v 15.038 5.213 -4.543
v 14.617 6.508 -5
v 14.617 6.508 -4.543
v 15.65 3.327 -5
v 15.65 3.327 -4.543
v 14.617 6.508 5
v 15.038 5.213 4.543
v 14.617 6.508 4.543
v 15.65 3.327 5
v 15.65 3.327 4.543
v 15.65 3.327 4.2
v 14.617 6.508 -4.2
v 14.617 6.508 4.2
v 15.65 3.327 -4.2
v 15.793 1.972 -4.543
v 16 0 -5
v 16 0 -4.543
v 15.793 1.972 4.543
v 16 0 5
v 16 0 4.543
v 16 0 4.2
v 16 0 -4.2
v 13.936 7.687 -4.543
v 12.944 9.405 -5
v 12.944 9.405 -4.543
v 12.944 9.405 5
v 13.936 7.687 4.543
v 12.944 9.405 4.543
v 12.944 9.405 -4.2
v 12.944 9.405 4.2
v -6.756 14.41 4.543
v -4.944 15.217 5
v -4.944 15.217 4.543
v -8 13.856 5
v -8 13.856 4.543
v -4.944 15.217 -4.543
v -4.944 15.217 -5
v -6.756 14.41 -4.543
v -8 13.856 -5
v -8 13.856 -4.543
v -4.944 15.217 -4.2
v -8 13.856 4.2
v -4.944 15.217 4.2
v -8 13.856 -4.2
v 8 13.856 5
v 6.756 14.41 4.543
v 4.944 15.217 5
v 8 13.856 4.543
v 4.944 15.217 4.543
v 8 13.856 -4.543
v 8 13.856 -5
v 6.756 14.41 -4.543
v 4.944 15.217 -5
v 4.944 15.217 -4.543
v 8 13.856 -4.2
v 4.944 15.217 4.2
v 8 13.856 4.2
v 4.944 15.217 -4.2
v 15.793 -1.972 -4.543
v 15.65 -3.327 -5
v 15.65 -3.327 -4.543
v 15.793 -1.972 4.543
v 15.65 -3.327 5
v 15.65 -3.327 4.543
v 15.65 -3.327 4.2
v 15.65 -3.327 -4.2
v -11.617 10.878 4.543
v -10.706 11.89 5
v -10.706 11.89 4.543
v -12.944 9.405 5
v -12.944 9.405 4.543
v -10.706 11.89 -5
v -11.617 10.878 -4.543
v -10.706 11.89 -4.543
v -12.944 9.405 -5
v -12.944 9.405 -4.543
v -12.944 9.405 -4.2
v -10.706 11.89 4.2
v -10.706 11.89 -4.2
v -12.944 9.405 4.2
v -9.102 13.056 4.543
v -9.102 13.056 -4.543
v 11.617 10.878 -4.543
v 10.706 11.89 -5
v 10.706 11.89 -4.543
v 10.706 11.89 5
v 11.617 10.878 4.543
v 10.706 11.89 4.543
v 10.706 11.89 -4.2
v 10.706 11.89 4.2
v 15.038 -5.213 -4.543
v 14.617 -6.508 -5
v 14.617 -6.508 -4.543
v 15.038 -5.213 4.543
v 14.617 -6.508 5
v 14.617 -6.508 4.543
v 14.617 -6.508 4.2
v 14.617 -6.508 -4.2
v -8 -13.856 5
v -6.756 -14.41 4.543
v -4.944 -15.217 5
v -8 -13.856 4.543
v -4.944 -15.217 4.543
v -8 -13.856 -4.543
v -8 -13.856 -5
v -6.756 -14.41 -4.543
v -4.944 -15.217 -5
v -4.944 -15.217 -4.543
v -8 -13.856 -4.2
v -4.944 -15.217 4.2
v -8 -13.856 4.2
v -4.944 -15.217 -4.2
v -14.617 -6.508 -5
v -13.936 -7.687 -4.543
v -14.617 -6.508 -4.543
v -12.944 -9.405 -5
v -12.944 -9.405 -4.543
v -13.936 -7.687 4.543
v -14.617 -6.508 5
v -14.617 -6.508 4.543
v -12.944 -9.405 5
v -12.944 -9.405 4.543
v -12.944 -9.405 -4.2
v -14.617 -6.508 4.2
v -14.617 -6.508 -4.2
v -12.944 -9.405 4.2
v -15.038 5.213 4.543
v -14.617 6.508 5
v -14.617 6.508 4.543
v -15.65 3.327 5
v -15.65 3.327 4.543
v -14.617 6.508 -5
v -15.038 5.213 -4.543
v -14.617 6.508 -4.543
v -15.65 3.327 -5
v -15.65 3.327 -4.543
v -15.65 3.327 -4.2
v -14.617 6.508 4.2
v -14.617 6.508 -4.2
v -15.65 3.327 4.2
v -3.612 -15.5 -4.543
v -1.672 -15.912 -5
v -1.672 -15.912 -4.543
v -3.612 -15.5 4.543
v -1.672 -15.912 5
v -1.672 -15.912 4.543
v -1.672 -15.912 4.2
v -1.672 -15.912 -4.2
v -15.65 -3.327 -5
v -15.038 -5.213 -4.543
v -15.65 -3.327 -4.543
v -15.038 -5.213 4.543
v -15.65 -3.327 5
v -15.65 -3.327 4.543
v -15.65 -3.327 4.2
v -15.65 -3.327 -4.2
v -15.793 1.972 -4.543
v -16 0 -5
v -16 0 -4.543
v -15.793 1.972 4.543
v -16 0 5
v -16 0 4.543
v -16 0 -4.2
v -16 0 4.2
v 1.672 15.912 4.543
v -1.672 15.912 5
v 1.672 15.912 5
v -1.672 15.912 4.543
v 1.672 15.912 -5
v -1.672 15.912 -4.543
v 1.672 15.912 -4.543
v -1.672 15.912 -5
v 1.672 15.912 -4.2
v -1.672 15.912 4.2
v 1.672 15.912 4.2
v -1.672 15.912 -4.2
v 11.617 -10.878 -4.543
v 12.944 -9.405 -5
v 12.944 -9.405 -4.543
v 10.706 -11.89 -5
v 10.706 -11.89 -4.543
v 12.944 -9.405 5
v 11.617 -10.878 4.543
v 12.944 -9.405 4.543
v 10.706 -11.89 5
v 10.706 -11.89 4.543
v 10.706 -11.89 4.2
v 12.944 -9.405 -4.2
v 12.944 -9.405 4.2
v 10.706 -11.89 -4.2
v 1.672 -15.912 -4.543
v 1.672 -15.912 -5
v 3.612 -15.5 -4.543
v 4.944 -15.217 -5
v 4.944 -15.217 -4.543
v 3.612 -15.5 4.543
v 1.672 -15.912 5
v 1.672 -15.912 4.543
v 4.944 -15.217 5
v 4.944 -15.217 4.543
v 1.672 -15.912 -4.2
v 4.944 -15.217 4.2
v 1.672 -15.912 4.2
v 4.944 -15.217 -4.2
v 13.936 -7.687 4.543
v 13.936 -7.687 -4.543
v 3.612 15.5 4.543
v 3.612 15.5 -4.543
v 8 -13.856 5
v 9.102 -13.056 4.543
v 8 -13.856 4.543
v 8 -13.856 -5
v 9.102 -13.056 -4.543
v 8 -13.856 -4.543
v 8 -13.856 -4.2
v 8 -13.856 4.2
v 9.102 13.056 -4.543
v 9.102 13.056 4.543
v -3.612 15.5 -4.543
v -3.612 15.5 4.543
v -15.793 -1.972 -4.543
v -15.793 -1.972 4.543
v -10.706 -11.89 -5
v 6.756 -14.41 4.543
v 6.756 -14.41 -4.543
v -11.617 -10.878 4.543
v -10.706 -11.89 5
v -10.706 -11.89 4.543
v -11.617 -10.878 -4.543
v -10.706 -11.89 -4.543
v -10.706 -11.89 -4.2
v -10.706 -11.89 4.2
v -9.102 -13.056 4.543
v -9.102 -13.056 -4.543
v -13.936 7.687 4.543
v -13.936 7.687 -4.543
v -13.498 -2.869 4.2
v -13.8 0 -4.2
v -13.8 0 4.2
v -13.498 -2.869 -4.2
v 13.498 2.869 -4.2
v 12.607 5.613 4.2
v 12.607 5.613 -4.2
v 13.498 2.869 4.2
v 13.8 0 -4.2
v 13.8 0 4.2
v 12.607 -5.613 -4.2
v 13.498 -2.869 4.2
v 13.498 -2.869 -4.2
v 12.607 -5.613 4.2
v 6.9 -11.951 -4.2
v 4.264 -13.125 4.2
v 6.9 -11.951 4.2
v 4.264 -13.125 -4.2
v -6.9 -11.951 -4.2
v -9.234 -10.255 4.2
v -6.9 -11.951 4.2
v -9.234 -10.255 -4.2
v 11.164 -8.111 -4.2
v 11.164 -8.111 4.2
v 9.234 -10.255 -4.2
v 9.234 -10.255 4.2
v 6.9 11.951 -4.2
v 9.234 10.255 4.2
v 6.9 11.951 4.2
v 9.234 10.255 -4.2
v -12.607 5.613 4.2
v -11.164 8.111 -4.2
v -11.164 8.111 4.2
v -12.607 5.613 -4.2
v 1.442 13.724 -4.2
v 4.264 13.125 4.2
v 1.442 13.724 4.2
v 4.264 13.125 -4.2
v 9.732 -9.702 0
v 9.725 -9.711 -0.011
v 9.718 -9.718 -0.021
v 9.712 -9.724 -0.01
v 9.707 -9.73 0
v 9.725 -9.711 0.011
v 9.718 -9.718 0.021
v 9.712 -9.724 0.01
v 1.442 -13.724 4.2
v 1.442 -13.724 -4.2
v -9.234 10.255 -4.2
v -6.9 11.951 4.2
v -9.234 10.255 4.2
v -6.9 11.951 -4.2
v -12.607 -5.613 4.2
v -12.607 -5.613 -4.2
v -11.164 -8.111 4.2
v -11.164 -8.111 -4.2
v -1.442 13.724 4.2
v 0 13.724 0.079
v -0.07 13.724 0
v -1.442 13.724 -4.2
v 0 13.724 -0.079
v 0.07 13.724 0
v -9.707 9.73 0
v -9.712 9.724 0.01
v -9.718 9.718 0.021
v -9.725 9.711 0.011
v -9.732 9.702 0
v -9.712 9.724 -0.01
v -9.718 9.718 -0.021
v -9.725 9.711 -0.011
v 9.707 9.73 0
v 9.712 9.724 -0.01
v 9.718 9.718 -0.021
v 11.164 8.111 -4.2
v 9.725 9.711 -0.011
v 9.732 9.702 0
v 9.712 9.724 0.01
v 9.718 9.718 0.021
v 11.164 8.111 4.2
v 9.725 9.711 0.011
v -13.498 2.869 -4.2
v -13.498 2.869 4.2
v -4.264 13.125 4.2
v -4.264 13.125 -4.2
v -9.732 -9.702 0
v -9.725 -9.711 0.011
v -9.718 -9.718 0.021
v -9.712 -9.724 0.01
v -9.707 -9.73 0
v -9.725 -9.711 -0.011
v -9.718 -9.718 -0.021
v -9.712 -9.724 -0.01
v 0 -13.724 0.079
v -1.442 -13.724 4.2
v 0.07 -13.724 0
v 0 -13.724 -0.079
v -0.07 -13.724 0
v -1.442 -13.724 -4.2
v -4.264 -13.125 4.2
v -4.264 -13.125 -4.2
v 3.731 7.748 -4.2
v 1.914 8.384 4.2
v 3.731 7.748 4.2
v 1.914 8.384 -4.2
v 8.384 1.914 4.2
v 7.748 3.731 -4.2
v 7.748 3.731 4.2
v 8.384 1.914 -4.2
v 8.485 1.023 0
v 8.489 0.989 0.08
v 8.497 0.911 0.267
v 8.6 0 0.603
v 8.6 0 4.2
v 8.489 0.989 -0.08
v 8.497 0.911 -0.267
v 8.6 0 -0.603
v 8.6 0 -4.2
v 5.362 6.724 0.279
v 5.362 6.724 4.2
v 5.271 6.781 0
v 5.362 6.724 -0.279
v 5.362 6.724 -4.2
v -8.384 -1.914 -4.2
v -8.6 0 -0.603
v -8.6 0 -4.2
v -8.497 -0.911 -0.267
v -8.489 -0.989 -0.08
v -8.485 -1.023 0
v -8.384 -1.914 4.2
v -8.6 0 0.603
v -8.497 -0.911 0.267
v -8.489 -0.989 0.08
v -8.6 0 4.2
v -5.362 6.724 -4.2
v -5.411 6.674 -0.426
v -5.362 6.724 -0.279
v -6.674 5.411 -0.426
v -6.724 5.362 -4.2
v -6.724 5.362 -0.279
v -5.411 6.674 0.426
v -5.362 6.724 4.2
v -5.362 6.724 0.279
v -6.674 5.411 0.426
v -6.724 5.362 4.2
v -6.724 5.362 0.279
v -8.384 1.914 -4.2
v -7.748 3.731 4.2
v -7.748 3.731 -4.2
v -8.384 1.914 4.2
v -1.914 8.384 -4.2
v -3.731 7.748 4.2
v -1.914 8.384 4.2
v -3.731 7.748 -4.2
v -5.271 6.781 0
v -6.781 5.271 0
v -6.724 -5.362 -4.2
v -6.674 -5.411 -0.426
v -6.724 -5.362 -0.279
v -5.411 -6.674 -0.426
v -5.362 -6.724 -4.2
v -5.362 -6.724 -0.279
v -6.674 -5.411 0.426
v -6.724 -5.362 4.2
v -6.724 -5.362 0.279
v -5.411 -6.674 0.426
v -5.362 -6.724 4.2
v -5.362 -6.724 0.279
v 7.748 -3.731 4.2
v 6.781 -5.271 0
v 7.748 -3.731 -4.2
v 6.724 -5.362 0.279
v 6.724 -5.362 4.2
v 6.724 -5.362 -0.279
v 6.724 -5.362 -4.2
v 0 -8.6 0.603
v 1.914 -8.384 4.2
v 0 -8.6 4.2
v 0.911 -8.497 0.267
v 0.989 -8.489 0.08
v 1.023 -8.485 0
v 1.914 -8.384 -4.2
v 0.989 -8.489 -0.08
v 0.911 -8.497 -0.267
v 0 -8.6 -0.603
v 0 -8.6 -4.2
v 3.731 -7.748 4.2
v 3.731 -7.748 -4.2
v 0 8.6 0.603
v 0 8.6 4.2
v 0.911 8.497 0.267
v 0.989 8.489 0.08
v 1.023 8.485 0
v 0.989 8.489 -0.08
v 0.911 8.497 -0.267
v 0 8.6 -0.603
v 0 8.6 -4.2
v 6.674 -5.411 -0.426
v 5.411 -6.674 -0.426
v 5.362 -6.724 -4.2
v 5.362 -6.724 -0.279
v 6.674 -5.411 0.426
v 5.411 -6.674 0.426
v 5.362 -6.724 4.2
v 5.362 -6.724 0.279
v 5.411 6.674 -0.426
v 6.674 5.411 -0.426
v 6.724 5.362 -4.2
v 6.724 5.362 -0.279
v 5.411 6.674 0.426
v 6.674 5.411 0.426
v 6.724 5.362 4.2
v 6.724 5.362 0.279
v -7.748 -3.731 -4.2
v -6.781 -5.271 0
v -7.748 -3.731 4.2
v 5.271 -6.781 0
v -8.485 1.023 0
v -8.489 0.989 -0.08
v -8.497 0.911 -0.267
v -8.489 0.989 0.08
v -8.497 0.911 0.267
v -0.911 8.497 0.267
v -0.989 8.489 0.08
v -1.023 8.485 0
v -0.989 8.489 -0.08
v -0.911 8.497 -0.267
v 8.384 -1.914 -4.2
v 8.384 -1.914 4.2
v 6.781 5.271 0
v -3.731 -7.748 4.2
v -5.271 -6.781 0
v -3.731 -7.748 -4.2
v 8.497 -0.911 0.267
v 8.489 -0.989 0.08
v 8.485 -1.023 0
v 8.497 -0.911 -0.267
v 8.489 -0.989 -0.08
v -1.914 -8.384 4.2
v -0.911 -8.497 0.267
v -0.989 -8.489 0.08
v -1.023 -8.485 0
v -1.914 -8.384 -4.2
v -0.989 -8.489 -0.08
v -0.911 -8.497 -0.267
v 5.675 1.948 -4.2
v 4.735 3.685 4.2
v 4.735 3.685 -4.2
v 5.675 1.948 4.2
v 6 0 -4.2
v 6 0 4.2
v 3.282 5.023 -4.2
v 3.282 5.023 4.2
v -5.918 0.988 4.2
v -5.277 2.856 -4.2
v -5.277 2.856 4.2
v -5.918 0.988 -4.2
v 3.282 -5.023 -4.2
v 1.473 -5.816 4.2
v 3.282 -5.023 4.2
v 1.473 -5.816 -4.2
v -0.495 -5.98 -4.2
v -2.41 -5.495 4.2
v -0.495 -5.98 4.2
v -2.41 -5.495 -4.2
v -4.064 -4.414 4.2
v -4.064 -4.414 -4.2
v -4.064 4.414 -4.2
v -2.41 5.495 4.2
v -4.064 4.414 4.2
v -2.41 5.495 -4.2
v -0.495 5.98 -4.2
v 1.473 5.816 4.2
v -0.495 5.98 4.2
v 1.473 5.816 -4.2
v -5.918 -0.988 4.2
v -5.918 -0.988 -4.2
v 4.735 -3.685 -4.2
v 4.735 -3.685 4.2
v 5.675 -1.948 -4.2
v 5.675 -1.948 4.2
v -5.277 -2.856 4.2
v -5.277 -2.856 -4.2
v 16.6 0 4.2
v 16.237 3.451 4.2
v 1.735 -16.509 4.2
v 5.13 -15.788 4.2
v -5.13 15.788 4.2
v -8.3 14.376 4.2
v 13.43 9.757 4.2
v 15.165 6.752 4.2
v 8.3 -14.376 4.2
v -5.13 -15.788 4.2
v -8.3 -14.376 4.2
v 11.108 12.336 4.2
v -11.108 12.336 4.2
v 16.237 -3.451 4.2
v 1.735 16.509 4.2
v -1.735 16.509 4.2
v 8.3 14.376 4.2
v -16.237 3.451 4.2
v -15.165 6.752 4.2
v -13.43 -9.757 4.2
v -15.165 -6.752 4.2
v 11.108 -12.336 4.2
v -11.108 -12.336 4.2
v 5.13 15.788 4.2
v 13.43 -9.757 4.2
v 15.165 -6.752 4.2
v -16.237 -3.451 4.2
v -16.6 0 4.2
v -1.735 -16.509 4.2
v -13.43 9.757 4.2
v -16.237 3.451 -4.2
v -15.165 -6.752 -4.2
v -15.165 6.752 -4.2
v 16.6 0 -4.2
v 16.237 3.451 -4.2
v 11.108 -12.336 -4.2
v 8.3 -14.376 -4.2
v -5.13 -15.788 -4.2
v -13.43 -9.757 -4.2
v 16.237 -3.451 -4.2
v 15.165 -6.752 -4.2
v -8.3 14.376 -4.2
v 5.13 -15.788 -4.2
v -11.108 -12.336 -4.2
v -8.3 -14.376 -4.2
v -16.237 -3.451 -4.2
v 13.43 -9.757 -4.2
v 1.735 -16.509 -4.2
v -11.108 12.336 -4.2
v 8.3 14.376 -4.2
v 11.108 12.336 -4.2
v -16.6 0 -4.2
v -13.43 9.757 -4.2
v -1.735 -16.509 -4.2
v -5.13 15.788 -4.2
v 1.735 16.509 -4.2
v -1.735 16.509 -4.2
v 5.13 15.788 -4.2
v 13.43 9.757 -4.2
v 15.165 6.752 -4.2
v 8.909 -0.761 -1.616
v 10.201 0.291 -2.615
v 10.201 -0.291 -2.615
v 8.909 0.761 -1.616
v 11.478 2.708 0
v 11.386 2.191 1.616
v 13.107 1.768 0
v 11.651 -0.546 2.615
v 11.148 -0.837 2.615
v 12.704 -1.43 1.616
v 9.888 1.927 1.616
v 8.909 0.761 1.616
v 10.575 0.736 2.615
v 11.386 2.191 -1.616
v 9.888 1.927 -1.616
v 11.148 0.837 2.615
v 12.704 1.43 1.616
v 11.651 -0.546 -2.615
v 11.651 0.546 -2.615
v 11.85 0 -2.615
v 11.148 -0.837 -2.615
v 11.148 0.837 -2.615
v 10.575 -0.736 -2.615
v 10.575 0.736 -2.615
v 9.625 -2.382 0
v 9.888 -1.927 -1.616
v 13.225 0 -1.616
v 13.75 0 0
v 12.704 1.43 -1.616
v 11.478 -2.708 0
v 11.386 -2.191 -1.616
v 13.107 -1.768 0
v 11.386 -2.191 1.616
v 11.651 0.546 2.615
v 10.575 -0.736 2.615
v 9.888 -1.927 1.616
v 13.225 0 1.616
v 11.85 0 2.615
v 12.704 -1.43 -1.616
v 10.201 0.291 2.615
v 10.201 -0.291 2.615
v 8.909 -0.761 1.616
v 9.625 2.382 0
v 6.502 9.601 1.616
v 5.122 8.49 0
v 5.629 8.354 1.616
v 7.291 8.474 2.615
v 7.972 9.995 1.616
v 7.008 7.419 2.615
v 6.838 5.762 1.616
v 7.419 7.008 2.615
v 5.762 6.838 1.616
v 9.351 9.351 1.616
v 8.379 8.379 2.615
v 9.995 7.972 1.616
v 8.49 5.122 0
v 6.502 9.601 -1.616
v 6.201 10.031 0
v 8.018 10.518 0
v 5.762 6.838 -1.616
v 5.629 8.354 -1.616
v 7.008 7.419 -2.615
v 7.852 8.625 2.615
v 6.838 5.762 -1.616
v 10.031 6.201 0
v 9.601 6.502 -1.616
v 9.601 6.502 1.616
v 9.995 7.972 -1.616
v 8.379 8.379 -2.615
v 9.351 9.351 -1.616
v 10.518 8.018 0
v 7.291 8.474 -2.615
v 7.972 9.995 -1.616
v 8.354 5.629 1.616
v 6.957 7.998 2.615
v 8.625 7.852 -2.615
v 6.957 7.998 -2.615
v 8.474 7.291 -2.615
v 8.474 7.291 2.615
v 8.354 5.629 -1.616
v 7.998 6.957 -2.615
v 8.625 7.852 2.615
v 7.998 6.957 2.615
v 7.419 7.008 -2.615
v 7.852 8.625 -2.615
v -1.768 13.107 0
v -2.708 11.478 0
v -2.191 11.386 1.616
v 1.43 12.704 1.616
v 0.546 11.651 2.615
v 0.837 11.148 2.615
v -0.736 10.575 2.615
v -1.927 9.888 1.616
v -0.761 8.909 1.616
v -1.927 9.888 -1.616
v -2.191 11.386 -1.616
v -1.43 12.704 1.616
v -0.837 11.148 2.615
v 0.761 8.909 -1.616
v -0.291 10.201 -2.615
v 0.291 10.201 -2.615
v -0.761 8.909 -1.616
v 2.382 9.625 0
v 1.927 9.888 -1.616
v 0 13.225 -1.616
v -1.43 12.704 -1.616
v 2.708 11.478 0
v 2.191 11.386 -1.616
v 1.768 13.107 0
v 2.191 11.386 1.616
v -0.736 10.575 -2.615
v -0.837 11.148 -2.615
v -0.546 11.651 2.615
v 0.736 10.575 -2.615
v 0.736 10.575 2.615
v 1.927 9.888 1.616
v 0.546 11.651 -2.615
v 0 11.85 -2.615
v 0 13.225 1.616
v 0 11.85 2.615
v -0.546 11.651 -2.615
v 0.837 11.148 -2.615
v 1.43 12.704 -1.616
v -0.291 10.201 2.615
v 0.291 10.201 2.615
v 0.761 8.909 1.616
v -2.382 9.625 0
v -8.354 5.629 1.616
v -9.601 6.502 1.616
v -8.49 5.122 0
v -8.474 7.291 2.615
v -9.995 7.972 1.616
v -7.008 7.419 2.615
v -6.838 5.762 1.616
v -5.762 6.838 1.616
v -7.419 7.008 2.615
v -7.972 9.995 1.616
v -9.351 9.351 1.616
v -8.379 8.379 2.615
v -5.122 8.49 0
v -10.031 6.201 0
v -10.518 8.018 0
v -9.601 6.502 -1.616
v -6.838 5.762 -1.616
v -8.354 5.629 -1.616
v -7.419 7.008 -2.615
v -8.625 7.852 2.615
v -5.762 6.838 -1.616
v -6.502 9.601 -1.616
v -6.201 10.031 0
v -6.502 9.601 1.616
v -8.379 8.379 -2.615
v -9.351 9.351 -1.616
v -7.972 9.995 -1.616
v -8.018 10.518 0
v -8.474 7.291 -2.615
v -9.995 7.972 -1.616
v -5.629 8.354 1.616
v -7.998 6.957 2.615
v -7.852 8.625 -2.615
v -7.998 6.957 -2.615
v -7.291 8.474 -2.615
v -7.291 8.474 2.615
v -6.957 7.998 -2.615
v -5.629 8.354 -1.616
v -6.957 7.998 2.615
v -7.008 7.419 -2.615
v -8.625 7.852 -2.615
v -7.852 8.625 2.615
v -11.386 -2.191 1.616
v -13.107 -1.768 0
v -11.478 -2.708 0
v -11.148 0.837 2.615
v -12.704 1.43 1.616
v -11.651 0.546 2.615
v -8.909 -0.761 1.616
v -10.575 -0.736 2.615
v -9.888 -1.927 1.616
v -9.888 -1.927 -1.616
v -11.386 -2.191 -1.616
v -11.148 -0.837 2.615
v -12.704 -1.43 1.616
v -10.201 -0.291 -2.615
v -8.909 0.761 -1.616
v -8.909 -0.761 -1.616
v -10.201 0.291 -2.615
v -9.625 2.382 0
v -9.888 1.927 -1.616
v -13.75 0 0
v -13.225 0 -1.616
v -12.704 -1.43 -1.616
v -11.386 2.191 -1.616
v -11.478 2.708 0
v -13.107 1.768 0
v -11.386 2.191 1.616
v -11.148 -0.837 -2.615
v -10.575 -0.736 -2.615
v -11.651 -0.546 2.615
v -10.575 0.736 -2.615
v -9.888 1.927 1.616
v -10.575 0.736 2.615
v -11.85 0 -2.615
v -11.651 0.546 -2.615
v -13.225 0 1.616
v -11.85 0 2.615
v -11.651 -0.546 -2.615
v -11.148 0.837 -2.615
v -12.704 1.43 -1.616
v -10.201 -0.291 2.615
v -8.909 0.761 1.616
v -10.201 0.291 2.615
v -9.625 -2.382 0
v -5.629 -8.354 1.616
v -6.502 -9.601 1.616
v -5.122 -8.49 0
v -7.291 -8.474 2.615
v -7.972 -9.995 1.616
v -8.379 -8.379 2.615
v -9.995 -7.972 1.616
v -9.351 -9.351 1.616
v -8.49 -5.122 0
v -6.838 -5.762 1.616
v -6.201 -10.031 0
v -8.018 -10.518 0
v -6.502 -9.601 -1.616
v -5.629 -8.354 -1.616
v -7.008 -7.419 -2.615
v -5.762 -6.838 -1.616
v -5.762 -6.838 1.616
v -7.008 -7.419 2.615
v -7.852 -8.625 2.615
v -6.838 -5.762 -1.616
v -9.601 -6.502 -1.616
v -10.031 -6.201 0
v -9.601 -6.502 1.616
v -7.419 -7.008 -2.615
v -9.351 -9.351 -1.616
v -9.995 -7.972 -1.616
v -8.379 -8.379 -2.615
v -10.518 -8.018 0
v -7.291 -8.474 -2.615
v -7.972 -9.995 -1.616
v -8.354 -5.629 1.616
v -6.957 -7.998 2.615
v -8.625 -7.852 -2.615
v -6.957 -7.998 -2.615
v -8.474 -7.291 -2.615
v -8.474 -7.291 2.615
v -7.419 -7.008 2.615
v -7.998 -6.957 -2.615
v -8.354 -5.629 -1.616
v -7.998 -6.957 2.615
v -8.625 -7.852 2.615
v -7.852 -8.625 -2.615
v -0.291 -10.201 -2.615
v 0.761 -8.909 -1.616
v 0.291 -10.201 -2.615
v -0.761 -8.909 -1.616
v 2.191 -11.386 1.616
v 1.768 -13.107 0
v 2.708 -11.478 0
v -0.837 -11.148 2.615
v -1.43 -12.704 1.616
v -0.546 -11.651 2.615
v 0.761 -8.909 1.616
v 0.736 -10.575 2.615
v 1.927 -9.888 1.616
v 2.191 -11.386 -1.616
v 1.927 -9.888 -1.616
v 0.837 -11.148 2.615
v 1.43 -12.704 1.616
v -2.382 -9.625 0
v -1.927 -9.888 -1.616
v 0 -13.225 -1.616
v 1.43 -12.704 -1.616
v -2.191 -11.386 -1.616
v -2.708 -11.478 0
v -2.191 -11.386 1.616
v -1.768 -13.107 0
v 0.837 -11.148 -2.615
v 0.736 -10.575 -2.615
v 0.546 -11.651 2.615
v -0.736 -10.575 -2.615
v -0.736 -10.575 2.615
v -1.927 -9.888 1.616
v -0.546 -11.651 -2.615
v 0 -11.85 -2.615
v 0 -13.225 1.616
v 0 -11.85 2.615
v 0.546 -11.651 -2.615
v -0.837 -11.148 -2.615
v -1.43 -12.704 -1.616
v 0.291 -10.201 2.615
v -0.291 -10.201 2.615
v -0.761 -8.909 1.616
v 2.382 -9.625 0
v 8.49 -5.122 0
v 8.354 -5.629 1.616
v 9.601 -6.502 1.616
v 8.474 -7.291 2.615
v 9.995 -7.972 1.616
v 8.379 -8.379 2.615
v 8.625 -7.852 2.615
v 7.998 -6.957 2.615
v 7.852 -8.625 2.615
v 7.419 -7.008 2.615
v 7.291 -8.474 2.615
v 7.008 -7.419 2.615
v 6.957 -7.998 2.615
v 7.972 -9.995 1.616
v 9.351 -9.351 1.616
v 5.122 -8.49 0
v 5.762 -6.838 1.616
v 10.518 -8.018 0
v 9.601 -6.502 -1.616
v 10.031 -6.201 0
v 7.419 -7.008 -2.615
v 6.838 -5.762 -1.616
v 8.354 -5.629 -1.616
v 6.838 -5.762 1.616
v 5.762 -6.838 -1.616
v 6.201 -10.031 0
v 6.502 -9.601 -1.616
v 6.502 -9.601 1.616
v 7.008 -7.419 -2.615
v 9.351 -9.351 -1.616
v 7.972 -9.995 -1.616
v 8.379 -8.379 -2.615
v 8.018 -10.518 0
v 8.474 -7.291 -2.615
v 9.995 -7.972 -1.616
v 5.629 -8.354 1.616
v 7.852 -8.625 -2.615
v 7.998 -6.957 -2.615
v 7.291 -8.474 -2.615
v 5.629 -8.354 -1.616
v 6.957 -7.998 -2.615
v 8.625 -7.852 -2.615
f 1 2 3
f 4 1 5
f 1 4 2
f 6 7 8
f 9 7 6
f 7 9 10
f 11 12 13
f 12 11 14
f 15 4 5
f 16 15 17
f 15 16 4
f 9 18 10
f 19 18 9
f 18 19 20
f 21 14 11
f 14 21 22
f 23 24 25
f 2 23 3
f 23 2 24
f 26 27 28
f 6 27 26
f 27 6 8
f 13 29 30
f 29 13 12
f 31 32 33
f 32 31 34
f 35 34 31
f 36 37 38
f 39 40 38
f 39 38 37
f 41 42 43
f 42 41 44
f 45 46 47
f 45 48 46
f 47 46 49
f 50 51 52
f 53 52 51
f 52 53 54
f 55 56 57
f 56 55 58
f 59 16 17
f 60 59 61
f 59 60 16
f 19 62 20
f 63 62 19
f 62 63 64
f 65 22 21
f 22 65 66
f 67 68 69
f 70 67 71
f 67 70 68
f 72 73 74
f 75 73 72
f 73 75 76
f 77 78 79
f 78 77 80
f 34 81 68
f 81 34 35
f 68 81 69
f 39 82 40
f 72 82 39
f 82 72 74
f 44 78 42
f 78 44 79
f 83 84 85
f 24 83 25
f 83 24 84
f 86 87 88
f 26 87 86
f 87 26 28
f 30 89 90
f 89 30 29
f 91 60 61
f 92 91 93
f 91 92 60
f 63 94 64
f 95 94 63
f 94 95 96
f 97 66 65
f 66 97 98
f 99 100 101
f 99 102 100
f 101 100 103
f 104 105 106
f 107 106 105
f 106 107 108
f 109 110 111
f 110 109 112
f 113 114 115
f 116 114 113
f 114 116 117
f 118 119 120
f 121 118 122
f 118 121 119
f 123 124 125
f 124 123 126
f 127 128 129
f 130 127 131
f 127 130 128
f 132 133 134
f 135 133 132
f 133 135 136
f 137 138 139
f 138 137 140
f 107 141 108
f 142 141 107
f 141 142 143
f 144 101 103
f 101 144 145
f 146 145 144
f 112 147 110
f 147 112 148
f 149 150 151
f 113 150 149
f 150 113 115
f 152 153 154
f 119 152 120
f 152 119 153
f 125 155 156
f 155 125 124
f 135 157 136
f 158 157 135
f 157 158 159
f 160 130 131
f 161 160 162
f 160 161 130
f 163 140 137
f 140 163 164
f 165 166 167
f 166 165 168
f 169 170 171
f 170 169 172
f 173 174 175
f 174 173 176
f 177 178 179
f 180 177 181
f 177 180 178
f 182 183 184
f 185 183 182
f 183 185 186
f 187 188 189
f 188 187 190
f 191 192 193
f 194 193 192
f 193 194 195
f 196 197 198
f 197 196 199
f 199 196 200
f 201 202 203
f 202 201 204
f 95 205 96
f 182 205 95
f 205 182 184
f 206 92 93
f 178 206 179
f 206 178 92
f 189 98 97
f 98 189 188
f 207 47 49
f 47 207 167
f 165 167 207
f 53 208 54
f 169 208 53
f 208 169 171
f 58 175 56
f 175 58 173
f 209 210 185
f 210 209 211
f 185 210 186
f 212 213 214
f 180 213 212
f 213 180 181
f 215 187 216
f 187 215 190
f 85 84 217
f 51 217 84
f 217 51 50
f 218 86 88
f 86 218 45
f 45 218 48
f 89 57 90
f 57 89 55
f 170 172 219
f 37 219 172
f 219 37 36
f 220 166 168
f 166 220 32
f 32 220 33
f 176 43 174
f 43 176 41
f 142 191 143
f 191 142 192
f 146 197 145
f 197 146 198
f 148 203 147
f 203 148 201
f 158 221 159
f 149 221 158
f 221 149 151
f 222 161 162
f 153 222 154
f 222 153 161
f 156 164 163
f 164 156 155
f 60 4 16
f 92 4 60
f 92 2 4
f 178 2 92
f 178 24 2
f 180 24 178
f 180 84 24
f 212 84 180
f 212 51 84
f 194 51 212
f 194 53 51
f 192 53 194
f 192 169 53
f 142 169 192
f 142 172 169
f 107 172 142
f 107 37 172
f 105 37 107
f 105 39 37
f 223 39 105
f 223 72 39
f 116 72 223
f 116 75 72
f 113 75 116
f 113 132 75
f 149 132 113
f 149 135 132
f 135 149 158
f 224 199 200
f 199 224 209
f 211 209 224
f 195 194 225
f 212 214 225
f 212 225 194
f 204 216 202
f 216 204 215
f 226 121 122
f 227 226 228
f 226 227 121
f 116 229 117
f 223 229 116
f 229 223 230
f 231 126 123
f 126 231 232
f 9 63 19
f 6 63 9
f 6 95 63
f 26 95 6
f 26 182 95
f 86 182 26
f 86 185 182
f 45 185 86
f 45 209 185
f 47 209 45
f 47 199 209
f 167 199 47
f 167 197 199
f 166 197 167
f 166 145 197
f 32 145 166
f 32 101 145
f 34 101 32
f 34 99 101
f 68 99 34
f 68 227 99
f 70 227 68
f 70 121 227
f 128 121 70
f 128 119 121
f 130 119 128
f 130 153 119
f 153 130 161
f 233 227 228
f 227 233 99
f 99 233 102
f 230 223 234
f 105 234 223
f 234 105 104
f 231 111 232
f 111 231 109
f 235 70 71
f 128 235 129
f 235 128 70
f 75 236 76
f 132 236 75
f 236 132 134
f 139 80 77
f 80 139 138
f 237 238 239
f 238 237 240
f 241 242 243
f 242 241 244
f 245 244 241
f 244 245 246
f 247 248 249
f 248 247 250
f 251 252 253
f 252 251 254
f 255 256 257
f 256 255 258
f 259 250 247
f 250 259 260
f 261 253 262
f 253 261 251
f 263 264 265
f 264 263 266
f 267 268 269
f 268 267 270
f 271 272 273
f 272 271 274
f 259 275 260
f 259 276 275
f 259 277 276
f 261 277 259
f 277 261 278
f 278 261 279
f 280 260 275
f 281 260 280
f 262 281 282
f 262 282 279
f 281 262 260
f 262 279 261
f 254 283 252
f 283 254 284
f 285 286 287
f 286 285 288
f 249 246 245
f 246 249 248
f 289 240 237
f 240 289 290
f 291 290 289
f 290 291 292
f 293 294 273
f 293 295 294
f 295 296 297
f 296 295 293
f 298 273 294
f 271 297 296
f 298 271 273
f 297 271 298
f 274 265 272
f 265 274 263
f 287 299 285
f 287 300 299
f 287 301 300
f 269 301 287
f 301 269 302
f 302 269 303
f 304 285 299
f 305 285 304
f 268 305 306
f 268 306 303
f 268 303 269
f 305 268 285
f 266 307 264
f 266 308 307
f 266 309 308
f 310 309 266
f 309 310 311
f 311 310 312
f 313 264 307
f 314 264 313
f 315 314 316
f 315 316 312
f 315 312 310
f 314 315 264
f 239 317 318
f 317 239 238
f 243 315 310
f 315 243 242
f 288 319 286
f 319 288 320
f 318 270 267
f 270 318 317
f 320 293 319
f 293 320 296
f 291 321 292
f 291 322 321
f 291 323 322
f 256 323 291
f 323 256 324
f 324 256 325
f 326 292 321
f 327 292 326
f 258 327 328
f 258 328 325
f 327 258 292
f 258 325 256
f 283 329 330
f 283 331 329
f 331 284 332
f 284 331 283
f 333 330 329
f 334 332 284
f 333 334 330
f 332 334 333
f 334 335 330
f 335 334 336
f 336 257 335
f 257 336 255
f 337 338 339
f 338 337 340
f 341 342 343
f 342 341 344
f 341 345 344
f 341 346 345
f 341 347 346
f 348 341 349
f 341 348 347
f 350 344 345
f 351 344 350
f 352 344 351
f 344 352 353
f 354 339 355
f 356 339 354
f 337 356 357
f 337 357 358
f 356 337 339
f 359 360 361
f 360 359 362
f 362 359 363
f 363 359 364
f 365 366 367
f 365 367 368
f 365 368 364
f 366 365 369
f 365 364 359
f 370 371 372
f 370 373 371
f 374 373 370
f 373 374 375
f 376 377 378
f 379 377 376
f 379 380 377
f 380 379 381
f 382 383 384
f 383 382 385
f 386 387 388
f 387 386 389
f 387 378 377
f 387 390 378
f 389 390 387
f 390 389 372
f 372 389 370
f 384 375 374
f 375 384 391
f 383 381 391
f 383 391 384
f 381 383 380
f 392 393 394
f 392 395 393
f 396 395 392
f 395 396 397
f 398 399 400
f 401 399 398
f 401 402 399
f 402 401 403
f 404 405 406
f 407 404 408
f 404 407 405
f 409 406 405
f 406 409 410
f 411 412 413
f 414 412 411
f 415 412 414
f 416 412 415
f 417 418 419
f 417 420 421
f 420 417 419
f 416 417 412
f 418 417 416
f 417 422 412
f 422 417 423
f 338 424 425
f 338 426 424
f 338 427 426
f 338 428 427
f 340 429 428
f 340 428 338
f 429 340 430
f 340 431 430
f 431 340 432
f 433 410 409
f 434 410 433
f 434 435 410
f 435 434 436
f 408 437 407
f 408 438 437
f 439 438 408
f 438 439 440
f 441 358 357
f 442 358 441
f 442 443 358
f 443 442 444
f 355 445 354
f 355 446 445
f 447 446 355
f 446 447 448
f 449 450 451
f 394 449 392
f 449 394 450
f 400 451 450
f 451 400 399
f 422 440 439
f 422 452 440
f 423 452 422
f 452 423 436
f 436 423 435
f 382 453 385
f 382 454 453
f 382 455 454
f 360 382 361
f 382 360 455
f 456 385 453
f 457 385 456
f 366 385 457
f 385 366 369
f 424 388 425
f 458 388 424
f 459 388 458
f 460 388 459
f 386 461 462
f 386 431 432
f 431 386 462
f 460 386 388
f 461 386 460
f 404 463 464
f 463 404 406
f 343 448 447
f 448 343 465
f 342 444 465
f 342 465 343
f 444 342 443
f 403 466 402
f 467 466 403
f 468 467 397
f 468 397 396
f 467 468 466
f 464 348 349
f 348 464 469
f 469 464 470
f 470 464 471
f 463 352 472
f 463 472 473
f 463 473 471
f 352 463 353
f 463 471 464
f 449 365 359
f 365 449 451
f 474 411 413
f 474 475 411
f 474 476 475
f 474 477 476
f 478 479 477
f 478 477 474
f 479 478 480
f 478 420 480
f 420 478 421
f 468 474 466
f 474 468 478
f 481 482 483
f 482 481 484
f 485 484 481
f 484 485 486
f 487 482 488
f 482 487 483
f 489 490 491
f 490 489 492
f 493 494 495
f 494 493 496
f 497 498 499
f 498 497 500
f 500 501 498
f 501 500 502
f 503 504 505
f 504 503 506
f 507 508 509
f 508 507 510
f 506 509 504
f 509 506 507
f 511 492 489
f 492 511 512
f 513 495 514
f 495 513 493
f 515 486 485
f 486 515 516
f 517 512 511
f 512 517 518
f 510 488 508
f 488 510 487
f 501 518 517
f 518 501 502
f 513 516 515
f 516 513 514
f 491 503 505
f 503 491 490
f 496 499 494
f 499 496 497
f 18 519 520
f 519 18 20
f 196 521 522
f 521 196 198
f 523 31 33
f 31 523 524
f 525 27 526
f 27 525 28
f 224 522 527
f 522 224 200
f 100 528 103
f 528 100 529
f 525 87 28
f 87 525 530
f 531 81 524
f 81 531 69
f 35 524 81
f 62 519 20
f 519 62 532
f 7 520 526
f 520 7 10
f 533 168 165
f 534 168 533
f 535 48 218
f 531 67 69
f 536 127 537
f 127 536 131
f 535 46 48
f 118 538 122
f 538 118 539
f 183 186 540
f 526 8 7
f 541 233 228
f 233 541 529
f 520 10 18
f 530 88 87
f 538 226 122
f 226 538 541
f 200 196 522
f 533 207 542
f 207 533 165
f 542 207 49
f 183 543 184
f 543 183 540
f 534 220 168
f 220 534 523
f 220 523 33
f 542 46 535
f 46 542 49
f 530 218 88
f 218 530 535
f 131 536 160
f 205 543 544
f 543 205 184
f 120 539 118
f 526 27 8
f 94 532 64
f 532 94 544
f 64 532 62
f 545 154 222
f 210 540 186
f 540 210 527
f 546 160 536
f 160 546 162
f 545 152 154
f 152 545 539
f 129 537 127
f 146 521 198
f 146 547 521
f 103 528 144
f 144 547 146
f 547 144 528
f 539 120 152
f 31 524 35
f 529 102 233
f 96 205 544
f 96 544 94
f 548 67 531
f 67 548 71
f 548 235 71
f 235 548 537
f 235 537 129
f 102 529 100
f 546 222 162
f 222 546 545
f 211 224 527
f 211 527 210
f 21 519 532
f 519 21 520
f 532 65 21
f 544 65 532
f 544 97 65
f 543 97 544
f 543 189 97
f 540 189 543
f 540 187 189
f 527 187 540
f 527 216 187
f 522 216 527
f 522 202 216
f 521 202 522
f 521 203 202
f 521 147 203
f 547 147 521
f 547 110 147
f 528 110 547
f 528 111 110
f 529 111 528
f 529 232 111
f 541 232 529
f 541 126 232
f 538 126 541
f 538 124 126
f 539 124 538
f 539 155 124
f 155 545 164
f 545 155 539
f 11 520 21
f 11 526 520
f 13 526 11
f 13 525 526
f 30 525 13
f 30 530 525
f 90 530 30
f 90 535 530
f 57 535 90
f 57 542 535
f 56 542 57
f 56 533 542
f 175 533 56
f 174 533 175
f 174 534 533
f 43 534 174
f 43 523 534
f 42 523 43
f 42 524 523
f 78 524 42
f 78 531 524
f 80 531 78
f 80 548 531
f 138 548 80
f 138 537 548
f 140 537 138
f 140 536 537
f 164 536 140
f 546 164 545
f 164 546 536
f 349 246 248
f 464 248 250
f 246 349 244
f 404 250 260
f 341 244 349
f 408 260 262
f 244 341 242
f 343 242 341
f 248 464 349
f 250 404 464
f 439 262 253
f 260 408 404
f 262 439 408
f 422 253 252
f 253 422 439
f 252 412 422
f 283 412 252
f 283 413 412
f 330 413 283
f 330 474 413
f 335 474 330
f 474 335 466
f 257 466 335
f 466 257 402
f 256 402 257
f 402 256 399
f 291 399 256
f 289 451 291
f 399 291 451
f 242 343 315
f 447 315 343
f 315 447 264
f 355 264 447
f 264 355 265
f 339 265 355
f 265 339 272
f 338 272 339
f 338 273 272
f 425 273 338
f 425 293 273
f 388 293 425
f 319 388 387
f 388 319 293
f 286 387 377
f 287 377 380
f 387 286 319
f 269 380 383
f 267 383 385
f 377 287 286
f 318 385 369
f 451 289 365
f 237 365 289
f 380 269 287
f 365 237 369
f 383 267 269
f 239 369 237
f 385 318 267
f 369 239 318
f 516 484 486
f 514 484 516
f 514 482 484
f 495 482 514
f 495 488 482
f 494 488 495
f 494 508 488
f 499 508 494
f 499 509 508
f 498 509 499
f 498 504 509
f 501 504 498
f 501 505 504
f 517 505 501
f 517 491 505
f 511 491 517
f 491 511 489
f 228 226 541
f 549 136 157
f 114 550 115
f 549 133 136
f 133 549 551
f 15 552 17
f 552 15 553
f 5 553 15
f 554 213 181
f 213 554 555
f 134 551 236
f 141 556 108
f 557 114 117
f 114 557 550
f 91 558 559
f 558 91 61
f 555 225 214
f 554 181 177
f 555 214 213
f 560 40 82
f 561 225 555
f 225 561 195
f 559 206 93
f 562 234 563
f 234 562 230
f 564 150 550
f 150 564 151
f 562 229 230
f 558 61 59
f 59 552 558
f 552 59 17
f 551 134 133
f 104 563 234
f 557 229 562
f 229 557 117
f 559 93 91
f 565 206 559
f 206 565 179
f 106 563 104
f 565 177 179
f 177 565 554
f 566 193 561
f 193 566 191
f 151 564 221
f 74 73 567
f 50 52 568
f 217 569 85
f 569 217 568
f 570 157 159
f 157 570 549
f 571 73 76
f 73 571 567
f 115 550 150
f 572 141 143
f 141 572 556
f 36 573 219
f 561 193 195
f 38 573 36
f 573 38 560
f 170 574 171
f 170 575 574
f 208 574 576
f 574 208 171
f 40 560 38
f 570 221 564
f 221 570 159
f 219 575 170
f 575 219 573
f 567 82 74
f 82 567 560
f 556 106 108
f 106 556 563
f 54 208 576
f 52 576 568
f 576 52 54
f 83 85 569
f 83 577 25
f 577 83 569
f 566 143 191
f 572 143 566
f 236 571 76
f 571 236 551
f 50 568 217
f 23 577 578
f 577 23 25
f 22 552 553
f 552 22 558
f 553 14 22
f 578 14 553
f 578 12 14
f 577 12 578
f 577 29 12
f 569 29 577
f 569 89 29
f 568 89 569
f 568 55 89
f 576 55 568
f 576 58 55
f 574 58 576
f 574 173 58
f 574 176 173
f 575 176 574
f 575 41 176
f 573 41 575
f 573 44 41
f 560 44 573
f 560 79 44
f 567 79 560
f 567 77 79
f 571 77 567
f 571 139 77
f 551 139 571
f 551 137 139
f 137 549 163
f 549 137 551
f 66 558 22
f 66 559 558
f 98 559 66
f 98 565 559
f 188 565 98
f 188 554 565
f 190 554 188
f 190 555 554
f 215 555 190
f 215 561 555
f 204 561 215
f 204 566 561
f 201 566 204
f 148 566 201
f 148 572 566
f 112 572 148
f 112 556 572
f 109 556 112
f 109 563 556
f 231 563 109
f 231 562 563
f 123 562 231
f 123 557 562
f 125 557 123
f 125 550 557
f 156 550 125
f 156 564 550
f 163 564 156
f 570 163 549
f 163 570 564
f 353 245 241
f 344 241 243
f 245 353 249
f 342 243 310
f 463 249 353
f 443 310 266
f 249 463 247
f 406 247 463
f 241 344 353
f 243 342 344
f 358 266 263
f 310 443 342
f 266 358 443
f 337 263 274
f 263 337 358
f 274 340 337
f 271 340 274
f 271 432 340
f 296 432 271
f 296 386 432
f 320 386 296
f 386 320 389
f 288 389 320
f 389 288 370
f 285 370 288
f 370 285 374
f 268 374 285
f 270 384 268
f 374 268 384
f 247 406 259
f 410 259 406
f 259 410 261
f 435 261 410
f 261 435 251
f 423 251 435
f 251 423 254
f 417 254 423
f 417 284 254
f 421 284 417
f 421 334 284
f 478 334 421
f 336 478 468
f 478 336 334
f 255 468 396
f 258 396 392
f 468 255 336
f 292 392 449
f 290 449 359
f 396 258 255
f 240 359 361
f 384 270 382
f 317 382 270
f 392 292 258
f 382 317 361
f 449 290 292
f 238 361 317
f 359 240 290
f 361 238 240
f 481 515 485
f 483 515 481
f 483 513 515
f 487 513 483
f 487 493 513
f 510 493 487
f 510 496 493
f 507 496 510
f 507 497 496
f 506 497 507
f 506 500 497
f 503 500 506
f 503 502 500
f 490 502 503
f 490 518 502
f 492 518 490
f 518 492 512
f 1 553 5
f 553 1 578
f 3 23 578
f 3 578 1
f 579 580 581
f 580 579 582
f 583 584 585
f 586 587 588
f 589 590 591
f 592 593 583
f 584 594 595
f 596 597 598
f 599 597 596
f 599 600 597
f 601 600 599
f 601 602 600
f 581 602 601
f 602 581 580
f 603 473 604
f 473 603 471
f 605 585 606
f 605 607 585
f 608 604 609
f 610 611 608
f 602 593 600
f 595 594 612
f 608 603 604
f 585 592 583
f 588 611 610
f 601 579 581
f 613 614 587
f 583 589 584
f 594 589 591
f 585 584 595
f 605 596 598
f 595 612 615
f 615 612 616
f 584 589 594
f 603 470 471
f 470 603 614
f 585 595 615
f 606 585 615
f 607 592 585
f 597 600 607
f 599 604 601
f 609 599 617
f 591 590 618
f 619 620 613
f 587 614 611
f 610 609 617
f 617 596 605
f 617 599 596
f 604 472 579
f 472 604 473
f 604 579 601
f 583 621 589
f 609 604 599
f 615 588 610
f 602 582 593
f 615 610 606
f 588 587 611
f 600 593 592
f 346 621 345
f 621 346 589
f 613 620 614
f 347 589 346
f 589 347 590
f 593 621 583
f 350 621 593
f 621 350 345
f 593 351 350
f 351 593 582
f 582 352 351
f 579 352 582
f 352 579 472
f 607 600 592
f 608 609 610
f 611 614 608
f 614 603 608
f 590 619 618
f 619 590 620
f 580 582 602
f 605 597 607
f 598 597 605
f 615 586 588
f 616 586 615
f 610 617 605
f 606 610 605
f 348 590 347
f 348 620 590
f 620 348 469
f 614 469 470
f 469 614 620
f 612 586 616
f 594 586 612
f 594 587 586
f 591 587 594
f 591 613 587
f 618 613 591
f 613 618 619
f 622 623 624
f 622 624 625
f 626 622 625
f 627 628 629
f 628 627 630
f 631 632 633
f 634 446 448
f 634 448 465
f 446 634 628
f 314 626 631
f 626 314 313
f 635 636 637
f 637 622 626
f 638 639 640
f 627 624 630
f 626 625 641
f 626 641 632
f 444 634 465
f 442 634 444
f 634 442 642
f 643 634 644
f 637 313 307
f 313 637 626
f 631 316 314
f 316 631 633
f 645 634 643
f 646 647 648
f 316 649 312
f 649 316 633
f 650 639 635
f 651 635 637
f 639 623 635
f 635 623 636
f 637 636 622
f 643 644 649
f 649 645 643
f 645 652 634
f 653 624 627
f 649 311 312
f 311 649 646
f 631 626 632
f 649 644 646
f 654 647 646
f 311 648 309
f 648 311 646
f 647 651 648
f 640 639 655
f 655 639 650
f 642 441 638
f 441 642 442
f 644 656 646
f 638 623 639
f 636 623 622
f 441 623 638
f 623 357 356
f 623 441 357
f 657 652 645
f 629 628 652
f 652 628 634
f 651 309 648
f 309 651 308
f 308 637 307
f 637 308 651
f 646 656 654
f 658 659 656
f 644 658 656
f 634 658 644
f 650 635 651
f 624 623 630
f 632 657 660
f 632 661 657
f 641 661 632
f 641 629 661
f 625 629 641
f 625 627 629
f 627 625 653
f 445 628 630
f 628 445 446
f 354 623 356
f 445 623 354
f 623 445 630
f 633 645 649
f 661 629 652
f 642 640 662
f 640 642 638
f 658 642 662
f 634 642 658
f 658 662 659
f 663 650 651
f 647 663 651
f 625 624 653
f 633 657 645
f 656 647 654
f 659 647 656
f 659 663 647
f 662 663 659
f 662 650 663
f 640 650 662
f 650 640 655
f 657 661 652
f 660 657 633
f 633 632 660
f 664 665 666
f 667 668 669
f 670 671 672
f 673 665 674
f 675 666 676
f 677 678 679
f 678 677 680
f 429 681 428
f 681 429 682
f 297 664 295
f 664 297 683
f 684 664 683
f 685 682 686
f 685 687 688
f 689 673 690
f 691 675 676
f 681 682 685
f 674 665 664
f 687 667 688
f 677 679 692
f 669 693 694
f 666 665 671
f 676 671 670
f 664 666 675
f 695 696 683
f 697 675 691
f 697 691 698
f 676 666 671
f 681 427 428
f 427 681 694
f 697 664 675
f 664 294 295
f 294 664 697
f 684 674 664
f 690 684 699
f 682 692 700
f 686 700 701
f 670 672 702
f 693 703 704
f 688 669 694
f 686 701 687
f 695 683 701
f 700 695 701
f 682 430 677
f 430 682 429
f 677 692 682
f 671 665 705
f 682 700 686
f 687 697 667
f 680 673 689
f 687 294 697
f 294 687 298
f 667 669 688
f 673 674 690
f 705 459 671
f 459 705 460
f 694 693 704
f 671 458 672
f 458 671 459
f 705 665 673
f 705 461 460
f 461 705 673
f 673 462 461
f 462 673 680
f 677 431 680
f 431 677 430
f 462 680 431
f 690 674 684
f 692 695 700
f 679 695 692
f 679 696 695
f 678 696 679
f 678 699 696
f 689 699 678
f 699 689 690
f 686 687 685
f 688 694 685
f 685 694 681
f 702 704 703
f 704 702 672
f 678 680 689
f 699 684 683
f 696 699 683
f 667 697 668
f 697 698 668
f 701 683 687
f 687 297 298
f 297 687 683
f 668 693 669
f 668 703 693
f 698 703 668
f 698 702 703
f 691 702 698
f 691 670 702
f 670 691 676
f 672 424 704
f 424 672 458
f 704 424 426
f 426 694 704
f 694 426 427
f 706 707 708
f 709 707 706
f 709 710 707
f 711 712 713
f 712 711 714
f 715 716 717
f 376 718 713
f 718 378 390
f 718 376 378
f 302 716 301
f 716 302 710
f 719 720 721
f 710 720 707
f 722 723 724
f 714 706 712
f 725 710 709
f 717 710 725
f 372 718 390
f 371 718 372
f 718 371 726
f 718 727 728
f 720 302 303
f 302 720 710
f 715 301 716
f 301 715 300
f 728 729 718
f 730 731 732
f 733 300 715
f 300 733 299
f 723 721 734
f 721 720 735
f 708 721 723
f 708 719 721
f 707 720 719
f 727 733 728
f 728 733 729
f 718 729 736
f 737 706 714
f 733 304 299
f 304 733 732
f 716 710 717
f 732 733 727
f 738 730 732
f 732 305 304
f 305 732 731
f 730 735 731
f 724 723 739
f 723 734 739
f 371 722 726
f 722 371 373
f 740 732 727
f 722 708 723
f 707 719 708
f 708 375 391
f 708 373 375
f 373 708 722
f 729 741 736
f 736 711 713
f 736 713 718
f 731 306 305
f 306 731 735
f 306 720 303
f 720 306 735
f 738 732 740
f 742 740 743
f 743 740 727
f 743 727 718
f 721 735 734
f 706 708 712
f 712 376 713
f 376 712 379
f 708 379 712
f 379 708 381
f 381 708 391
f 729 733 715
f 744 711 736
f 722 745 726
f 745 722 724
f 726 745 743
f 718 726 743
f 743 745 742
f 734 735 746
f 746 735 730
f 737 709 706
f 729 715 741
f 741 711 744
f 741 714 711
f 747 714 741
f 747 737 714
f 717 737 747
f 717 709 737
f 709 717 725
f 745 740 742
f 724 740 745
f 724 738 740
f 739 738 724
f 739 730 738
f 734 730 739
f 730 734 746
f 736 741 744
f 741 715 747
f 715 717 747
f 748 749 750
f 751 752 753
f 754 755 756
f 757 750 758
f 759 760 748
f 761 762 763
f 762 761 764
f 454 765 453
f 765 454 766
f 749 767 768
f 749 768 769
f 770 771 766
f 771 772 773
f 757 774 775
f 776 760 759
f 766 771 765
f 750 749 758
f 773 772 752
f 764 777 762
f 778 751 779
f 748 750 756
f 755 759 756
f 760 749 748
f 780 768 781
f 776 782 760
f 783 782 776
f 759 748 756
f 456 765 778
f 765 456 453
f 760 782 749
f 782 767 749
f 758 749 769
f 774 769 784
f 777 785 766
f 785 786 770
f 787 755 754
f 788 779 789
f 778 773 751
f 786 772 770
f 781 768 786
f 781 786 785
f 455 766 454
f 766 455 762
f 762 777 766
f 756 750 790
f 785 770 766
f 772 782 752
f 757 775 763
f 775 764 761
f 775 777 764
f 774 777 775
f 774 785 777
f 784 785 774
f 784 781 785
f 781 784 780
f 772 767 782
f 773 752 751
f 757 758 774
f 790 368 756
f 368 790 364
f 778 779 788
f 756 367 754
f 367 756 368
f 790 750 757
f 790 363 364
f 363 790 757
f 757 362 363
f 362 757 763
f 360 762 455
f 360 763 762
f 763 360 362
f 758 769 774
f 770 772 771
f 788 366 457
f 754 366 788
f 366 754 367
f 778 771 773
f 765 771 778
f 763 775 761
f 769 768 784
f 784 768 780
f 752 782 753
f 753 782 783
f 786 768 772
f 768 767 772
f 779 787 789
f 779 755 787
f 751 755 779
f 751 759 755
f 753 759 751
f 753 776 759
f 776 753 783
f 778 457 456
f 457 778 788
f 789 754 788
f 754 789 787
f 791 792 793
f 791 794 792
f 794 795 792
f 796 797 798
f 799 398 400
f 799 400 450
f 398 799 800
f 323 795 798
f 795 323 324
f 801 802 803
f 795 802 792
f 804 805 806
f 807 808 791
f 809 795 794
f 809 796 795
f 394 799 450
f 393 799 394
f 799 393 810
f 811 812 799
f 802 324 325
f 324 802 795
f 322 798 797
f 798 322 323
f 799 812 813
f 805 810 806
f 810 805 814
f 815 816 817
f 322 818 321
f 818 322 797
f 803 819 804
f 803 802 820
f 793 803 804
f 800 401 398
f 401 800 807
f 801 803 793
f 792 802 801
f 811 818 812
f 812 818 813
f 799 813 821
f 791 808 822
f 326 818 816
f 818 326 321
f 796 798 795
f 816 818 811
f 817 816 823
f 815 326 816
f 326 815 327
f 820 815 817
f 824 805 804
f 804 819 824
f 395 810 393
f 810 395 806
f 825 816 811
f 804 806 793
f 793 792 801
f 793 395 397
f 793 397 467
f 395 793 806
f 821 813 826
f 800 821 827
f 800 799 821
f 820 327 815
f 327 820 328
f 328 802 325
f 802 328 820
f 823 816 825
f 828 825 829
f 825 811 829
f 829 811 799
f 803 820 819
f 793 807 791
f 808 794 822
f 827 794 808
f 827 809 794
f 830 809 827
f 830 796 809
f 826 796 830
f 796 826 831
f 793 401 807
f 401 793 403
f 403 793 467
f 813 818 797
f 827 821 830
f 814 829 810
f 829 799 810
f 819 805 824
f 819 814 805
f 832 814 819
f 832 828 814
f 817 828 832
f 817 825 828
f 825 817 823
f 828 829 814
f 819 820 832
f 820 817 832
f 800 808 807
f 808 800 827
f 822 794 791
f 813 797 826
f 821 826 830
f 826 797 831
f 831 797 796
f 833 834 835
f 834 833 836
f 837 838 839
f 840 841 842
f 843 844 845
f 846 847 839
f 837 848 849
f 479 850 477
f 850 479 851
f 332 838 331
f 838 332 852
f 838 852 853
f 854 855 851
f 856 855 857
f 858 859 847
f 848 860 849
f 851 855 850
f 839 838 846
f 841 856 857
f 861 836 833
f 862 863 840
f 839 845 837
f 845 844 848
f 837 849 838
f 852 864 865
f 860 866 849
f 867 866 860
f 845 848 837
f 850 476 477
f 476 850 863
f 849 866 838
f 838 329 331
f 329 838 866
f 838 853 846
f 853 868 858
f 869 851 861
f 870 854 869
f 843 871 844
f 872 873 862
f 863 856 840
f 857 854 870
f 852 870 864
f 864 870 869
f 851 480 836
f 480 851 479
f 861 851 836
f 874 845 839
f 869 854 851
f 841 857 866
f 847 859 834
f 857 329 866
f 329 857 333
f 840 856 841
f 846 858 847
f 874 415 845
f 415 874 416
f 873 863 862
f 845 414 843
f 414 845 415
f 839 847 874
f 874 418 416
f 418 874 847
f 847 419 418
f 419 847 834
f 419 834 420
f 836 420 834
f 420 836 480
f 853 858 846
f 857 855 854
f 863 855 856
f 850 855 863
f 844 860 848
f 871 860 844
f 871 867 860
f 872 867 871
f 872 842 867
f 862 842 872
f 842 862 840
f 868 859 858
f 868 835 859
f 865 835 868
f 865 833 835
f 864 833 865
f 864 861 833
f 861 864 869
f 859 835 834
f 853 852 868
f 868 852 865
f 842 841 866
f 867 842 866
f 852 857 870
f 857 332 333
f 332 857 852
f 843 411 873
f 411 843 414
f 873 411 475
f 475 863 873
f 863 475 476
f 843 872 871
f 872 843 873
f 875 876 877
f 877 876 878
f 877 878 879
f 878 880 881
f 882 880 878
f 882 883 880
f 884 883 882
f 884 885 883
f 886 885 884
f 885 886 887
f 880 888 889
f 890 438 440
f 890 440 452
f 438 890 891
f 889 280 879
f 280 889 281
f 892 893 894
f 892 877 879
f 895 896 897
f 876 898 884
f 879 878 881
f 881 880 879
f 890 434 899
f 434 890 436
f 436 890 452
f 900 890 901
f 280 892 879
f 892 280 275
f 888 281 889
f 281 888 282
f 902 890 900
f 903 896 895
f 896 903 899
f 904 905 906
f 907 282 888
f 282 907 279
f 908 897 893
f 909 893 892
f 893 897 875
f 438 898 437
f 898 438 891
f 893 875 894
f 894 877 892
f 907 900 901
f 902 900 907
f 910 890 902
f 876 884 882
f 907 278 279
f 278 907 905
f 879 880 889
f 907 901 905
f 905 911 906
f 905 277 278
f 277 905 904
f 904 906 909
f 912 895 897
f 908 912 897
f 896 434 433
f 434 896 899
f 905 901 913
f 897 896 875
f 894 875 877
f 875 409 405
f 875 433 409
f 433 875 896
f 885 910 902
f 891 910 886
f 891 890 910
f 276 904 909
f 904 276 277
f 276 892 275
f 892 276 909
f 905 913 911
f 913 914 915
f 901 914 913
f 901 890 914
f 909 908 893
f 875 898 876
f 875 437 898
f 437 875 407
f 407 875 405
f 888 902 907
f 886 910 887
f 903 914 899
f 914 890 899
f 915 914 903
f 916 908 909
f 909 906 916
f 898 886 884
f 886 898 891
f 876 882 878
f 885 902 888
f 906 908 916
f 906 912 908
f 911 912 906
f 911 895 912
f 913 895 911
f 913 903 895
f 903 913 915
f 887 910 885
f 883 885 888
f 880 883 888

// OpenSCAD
// Parameters
bore_diameter_mm = 12; //[6:24:0.5]
outer_diameter_mm = 32; //[16:64:0.5]
width_mm = 10; //[5:20:0.5]
bore_radius_mm = 6; //[3:12:0.5]
outer_radius_mm = 16; //[8:32:0.5]
eps_mm = 0.6; //[0.2:2:0.1]
rim_thickness_mm = 2.2; //[1.1:4.4:0.1]
hub_thickness_mm = 2.6; //[1.3:5.2:0.1]
shield_thickness_mm = 0.6; //[0.3:1.2:0.1]
shield_radial_gap_mm = 0.4; //[0.2:1:0.1]
ball_diameter_mm = 5.5; //[3:8:0.1]
ball_count = 8; //[6:12:1]
ball_pitch_radius_mm = 11; //[8:14:0.1]
raceway_clearance_mm = 0.4; //[0.2:1:0.1]
chamfer_mm = 0.8; //[0.4:1.6:0.1]

// Bearing Ball - complete geometry
module bearing_ball() {
  color("Silver") {
    sphere(r=ball_diameter_mm/2);
  }
}

// Ball Bearing - complete geometry
module ball_bearing() {
  color("DimGray") {
    // Outer race
    difference() {
      cylinder(r=outer_diameter_mm/2, h=width_mm, center=true);
      cylinder(r=outer_diameter_mm/2 - rim_thickness_mm, h=width_mm + 2*eps_mm, center=true);
    }
    // Inner race
    difference() {
      cylinder(r=bore_diameter_mm/2 + hub_thickness_mm, h=width_mm, center=true);
      cylinder(r=bore_diameter_mm/2, h=width_mm + 2*eps_mm, center=true);
    }
    // Shields
    difference() {
      union() {
        translate([0, 0, -width_mm/2 + shield_thickness_mm/2])
          cylinder(r=outer_diameter_mm/2 - rim_thickness_mm - shield_radial_gap_mm, h=shield_thickness_mm, center=true);
        translate([0, 0, width_mm/2 - shield_thickness_mm/2])
          cylinder(r=outer_diameter_mm/2 - rim_thickness_mm - shield_radial_gap_mm, h=shield_thickness_mm, center=true);
      }
      cylinder(r=bore_diameter_mm/2 + hub_thickness_mm + shield_radial_gap_mm, h=shield_thickness_mm + 2*eps_mm, center=true);
    }
    // Chamfers
    union() {
      translate([0, 0, width_mm/2 - chamfer_mm/2])
        cylinder(r1=outer_diameter_mm/2 + eps_mm, r2=outer_diameter_mm/2 - chamfer_mm, h=chamfer_mm, center=true);
      translate([0, 0, -width_mm/2 + chamfer_mm/2])
        cylinder(r1=outer_diameter_mm/2 - chamfer_mm, r2=outer_diameter_mm/2 + eps_mm, h=chamfer_mm, center=true);
      translate([0, 0, width_mm/2 - chamfer_mm/2])
        cylinder(r1=bore_diameter_mm/2 + chamfer_mm, r2=bore_diameter_mm/2 - eps_mm, h=chamfer_mm, center=true);
      translate([0, 0, -width_mm/2 + chamfer_mm/2])
        cylinder(r1=bore_diameter_mm/2 - eps_mm, r2=bore_diameter_mm/2 + chamfer_mm, h=chamfer_mm, center=true);
    }
  }
}

// Assembly
module assembly() {
  ball_bearing();
  for (i = [0:ball_count-1]) {
    rotate([0, 0, i*360/ball_count])
      translate([ball_pitch_radius_mm, 0, 0])
      bearing_ball();
  }
}

assembly();
